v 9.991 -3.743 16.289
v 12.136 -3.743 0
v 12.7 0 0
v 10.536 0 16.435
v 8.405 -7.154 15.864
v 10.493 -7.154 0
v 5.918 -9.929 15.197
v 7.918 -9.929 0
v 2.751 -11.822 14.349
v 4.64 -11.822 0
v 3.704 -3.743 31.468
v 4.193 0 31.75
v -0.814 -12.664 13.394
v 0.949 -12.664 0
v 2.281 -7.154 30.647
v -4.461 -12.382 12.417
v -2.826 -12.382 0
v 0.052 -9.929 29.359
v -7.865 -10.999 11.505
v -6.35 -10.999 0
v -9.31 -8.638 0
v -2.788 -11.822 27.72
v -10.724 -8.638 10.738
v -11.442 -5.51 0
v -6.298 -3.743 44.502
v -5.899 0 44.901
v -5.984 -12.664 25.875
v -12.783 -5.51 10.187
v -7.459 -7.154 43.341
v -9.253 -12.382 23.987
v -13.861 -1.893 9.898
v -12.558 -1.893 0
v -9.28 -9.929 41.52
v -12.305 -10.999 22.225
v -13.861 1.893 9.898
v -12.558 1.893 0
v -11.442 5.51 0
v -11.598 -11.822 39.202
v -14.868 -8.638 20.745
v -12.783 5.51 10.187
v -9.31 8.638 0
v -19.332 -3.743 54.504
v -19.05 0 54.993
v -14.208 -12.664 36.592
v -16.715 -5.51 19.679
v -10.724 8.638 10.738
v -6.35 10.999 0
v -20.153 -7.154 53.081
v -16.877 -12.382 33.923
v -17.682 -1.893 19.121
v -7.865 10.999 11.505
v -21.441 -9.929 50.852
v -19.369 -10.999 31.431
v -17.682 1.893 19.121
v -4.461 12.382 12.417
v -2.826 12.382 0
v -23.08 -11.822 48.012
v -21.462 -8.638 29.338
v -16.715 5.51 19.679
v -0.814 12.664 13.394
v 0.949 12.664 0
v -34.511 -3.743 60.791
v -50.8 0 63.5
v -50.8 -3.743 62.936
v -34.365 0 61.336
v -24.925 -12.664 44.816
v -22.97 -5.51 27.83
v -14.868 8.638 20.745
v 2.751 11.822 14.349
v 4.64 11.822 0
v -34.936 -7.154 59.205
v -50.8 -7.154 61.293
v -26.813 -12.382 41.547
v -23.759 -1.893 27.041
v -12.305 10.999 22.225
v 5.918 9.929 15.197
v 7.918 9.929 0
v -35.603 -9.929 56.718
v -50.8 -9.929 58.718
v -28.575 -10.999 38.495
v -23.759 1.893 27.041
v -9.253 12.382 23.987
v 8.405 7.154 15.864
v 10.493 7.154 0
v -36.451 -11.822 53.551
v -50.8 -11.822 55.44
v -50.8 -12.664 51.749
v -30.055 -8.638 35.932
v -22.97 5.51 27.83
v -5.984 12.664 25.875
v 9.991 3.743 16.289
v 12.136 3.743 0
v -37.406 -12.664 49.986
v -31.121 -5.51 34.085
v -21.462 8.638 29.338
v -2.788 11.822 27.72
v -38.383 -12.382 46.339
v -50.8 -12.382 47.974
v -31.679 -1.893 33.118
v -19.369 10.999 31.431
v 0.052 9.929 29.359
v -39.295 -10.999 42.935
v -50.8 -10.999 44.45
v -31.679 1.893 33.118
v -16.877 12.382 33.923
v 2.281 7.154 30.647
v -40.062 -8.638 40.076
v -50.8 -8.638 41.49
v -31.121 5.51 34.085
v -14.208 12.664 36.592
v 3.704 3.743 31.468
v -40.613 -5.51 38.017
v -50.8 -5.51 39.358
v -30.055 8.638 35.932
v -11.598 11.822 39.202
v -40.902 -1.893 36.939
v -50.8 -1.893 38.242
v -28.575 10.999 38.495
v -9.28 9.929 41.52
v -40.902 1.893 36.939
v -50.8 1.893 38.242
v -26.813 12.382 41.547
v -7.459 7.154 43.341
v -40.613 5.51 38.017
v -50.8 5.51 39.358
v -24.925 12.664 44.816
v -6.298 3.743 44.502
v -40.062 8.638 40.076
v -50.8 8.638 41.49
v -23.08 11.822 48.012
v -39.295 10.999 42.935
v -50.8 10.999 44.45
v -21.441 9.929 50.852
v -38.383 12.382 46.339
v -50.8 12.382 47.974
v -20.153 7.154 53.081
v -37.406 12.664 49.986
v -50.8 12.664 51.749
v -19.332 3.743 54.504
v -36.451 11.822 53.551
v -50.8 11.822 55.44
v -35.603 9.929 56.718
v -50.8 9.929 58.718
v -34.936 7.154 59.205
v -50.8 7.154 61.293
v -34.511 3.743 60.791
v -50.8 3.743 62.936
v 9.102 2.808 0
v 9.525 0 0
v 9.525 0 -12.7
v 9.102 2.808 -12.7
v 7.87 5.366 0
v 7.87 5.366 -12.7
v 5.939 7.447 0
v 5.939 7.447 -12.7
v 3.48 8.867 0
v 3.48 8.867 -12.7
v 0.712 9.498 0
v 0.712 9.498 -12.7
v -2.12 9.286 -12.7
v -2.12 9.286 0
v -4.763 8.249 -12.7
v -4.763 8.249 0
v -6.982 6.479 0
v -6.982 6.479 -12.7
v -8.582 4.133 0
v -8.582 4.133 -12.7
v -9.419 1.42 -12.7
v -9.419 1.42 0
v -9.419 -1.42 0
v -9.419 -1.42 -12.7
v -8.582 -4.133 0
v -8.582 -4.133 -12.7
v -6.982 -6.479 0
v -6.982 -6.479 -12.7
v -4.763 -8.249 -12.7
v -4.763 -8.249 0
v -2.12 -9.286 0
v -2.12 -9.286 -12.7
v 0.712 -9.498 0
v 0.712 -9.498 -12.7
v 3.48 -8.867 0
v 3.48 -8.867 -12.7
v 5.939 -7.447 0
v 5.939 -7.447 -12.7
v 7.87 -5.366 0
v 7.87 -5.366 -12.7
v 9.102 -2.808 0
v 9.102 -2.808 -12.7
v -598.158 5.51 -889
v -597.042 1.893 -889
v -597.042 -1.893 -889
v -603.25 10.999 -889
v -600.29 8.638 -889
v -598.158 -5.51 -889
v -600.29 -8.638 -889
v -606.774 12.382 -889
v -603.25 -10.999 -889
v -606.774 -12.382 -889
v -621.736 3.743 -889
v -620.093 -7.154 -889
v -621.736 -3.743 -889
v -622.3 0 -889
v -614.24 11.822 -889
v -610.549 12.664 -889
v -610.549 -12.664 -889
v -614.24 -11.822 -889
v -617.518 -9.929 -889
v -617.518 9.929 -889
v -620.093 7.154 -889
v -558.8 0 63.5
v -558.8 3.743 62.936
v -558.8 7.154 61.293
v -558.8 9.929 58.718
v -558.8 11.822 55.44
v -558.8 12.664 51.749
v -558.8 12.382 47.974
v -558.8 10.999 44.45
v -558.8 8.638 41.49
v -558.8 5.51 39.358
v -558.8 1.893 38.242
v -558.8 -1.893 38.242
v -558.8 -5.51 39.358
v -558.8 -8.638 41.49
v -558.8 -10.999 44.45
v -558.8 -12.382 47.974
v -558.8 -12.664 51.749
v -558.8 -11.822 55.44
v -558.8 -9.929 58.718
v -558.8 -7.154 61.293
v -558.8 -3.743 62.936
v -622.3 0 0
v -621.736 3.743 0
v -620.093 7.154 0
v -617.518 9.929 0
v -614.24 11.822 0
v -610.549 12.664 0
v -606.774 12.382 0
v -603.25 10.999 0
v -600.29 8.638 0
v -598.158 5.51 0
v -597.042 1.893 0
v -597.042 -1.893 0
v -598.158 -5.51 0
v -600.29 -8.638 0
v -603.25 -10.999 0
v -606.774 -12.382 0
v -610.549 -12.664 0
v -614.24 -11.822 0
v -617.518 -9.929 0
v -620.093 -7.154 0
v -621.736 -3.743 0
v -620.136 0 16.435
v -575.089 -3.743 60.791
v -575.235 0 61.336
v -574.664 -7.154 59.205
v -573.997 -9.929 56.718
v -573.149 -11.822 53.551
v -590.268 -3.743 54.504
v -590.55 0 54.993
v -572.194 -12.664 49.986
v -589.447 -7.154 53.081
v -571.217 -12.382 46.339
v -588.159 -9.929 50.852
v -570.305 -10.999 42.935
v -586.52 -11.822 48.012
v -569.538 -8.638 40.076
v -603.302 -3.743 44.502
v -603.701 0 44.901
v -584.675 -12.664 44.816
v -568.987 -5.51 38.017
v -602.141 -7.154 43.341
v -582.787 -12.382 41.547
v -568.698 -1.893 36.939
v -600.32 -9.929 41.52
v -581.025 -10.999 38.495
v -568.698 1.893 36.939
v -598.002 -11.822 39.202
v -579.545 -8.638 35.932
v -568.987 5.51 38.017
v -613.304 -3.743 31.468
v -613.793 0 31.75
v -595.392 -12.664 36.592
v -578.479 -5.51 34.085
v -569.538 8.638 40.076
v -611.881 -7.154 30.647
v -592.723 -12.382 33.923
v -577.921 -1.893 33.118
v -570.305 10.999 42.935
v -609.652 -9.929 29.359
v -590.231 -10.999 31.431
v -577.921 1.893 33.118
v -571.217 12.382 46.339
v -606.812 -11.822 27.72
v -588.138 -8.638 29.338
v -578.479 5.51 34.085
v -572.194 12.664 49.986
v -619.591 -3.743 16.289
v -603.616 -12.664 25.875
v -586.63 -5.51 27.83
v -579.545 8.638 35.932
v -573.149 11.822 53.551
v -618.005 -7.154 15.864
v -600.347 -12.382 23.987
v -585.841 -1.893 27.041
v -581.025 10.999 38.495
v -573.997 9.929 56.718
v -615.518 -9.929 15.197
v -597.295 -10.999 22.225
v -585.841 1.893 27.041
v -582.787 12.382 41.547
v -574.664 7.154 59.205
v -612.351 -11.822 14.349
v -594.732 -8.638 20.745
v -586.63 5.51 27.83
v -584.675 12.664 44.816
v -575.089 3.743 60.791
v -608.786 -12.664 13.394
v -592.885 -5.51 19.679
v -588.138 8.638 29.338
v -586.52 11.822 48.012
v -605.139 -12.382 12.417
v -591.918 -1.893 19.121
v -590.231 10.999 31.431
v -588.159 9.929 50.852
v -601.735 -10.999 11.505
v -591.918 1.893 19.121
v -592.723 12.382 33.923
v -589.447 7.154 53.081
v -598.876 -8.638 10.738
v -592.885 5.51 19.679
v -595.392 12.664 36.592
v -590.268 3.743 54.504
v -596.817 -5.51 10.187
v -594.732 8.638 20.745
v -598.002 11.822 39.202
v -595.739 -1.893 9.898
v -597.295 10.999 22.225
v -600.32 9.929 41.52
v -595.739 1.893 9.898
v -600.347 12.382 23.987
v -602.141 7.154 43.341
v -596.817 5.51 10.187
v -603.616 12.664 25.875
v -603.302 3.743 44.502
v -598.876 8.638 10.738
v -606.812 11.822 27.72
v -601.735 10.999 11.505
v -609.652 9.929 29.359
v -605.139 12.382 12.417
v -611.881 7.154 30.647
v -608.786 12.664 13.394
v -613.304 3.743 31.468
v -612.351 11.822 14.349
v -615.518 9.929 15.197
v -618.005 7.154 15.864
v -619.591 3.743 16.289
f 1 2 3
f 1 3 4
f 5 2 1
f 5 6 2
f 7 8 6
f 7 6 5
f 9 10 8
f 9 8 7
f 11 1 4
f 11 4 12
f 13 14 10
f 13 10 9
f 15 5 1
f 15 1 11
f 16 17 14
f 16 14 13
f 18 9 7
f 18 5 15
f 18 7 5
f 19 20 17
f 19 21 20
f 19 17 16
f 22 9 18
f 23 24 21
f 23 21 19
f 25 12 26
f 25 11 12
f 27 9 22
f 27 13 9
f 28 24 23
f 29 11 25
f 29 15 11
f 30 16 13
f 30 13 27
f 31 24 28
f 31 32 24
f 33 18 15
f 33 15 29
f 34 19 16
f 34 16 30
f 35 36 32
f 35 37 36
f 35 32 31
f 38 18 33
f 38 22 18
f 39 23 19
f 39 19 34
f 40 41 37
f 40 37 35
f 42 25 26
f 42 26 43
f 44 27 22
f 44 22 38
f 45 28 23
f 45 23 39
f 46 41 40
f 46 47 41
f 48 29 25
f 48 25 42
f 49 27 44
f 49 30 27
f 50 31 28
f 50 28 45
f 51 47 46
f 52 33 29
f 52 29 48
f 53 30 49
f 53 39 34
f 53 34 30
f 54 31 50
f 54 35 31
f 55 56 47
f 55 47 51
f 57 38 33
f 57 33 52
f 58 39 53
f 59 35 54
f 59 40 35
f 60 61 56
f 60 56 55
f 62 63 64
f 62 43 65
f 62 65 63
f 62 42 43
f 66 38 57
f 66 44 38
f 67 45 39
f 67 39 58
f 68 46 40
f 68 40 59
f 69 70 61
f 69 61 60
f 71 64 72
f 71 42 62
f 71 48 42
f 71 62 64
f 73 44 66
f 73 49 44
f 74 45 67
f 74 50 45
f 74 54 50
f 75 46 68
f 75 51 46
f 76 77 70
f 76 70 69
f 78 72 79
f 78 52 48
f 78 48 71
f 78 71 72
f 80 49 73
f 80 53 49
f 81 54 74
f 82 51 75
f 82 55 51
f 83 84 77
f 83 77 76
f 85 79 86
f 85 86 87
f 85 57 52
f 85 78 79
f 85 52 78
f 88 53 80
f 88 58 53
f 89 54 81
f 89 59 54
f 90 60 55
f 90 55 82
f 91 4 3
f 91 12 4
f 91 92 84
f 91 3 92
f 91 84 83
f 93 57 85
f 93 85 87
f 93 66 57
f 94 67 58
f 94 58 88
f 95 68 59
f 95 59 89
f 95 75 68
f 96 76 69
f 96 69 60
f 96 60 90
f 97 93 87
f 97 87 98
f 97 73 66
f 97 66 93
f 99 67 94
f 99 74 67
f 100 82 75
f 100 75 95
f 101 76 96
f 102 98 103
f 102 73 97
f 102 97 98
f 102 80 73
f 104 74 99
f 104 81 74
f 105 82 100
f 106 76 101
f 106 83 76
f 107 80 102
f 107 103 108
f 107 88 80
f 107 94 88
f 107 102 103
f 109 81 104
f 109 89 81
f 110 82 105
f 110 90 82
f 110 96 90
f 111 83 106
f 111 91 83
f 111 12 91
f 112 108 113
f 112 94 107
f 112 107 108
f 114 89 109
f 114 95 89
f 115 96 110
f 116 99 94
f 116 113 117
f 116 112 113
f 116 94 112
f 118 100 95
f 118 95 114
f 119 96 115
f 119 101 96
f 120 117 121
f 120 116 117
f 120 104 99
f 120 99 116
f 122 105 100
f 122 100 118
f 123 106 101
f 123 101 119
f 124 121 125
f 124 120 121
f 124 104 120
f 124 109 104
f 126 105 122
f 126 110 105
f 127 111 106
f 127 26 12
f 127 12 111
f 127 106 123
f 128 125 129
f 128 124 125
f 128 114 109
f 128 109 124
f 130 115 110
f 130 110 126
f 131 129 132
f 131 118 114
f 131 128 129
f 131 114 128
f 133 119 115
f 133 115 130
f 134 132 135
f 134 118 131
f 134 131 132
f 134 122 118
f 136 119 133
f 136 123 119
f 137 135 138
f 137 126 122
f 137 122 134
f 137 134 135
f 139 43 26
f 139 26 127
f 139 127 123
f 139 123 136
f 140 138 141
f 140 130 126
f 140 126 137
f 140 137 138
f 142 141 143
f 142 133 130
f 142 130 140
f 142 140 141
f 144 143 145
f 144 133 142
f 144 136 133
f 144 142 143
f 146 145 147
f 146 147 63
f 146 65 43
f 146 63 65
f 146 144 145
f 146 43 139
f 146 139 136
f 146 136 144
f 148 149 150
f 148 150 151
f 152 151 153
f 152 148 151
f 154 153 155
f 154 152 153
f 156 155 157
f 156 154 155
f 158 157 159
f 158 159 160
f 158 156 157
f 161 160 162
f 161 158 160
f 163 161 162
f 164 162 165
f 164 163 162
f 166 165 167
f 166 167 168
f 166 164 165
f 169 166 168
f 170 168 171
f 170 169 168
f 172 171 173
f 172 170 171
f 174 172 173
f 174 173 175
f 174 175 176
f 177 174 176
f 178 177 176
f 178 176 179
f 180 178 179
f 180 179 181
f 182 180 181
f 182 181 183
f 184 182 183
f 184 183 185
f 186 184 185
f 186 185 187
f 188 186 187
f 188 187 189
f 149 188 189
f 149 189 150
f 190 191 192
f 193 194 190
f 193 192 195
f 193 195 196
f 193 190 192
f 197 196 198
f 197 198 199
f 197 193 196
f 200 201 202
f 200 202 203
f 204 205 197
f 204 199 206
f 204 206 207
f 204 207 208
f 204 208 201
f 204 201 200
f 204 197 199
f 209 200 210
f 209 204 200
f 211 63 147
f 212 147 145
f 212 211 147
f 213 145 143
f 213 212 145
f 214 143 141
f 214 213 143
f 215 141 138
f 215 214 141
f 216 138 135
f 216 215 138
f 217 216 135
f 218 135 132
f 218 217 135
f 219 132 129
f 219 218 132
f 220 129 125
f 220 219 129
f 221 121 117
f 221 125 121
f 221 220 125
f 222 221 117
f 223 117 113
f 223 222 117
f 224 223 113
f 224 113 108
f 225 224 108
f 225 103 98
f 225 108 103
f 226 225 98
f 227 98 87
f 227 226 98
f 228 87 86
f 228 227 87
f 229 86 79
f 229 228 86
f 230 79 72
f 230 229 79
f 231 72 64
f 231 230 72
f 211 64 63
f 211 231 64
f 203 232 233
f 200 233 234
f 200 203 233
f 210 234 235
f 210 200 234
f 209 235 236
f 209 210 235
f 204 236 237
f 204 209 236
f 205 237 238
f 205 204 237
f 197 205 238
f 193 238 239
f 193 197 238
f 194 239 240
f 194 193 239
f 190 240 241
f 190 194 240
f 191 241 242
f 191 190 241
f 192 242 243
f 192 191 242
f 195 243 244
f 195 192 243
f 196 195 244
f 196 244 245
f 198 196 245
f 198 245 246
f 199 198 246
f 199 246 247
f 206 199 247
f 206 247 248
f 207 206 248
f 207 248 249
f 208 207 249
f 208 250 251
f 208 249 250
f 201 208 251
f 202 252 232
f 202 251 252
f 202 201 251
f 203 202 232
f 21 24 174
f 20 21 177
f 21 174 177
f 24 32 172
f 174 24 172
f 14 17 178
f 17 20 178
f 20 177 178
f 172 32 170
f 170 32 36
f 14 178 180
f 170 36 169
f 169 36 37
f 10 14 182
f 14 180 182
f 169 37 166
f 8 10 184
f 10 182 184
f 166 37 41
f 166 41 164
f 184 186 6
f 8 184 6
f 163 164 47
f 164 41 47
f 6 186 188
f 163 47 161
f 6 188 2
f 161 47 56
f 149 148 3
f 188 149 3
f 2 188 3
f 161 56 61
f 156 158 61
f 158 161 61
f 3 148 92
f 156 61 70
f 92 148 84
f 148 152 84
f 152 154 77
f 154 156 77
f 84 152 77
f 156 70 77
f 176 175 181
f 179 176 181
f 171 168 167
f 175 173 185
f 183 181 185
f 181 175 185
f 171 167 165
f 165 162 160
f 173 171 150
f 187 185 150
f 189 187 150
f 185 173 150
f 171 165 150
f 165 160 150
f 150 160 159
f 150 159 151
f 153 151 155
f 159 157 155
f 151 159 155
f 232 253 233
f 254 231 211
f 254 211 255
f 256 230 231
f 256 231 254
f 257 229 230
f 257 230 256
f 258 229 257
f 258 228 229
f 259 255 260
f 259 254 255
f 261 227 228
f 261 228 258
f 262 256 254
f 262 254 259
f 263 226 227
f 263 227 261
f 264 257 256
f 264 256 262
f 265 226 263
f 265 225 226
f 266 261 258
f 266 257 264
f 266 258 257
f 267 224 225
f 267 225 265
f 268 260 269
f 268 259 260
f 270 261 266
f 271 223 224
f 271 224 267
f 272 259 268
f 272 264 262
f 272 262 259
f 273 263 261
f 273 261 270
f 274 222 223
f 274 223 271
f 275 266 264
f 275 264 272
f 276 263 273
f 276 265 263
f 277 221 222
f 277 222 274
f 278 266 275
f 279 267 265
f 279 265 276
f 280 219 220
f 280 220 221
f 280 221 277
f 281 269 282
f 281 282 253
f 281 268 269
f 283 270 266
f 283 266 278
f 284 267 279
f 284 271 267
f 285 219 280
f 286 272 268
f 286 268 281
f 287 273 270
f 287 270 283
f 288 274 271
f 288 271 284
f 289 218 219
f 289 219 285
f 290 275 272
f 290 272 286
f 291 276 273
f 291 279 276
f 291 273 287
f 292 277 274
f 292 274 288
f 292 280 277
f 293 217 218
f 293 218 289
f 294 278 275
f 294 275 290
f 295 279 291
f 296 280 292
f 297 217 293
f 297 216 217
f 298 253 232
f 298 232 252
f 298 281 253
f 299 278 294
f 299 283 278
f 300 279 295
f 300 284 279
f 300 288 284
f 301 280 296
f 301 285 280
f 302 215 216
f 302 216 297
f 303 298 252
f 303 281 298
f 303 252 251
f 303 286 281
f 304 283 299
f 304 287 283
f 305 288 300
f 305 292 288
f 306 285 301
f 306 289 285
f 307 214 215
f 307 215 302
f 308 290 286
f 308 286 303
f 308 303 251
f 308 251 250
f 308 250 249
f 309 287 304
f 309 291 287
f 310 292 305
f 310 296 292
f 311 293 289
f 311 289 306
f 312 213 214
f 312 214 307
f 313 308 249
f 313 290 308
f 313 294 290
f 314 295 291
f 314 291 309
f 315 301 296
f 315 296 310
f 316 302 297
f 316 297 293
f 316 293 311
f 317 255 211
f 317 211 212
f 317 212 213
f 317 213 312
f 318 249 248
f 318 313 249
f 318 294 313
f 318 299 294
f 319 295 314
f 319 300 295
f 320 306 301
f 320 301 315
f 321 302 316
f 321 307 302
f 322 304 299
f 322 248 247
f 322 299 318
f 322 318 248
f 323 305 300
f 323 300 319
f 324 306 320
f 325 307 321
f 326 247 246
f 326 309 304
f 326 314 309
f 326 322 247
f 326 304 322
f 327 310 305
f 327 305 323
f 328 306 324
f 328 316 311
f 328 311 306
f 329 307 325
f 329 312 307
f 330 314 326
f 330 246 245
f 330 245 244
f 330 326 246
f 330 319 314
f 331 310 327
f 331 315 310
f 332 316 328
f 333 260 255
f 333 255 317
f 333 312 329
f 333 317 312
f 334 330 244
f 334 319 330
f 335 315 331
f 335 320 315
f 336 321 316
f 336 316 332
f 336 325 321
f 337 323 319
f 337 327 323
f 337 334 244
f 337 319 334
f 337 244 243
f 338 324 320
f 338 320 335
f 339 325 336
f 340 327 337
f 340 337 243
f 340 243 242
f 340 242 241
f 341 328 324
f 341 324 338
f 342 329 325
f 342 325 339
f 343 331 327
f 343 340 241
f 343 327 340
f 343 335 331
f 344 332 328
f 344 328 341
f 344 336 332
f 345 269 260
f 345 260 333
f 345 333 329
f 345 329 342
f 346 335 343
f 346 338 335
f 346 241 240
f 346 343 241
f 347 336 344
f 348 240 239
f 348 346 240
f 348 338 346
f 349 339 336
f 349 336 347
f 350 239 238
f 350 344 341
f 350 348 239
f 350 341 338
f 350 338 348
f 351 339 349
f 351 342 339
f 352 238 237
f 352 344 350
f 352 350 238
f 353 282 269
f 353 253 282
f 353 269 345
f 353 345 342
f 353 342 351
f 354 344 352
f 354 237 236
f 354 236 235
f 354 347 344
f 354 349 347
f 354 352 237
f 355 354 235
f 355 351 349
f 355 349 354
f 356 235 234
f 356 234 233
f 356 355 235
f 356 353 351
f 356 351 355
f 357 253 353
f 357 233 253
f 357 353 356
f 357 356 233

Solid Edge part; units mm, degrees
sketch "Sketch1" plane through (0, 0, 0) normal (0, 0, 1) x (1, 0, 0)
  circle A0 centre (0, 0) radius 9.525
extrude "Protrusion1" add sketch "Sketch1" against normal blind 12.7
sketch "Sketch2" plane through (0, 0, 0) normal (0, -1, 0) x (1, 0, 0)
  arc A0 (0, 0) -> (-50.8, 50.8) centre (-50.8, 0) ccw
  line L0 (-50.8, 50.8) -> (-558.8, 50.8)
  arc A1 (-558.8, 50.8) -> (-609.6, 0) centre (-558.8, 0) ccw
  line L1 (-609.6, 0) -> (-609.6, -889)
  dimension "D1" = 50.8
  dimension "D2" = 50.8
  dimension "D3" = 508
  dimension "D4" = 50.8
  dimension "D5" = 889
sketch "Sketch3" plane through (0, 0, 0) normal (0, 0, 1) x (1, 0, 0)
  circle A0 centre (0, 0) radius 12.7
  dimension "D1" = 19.05
  dimension "D2" = 25.4
sweep "SweptProtrusion_1" add profiles "Sketch3" path "Sketch2"
